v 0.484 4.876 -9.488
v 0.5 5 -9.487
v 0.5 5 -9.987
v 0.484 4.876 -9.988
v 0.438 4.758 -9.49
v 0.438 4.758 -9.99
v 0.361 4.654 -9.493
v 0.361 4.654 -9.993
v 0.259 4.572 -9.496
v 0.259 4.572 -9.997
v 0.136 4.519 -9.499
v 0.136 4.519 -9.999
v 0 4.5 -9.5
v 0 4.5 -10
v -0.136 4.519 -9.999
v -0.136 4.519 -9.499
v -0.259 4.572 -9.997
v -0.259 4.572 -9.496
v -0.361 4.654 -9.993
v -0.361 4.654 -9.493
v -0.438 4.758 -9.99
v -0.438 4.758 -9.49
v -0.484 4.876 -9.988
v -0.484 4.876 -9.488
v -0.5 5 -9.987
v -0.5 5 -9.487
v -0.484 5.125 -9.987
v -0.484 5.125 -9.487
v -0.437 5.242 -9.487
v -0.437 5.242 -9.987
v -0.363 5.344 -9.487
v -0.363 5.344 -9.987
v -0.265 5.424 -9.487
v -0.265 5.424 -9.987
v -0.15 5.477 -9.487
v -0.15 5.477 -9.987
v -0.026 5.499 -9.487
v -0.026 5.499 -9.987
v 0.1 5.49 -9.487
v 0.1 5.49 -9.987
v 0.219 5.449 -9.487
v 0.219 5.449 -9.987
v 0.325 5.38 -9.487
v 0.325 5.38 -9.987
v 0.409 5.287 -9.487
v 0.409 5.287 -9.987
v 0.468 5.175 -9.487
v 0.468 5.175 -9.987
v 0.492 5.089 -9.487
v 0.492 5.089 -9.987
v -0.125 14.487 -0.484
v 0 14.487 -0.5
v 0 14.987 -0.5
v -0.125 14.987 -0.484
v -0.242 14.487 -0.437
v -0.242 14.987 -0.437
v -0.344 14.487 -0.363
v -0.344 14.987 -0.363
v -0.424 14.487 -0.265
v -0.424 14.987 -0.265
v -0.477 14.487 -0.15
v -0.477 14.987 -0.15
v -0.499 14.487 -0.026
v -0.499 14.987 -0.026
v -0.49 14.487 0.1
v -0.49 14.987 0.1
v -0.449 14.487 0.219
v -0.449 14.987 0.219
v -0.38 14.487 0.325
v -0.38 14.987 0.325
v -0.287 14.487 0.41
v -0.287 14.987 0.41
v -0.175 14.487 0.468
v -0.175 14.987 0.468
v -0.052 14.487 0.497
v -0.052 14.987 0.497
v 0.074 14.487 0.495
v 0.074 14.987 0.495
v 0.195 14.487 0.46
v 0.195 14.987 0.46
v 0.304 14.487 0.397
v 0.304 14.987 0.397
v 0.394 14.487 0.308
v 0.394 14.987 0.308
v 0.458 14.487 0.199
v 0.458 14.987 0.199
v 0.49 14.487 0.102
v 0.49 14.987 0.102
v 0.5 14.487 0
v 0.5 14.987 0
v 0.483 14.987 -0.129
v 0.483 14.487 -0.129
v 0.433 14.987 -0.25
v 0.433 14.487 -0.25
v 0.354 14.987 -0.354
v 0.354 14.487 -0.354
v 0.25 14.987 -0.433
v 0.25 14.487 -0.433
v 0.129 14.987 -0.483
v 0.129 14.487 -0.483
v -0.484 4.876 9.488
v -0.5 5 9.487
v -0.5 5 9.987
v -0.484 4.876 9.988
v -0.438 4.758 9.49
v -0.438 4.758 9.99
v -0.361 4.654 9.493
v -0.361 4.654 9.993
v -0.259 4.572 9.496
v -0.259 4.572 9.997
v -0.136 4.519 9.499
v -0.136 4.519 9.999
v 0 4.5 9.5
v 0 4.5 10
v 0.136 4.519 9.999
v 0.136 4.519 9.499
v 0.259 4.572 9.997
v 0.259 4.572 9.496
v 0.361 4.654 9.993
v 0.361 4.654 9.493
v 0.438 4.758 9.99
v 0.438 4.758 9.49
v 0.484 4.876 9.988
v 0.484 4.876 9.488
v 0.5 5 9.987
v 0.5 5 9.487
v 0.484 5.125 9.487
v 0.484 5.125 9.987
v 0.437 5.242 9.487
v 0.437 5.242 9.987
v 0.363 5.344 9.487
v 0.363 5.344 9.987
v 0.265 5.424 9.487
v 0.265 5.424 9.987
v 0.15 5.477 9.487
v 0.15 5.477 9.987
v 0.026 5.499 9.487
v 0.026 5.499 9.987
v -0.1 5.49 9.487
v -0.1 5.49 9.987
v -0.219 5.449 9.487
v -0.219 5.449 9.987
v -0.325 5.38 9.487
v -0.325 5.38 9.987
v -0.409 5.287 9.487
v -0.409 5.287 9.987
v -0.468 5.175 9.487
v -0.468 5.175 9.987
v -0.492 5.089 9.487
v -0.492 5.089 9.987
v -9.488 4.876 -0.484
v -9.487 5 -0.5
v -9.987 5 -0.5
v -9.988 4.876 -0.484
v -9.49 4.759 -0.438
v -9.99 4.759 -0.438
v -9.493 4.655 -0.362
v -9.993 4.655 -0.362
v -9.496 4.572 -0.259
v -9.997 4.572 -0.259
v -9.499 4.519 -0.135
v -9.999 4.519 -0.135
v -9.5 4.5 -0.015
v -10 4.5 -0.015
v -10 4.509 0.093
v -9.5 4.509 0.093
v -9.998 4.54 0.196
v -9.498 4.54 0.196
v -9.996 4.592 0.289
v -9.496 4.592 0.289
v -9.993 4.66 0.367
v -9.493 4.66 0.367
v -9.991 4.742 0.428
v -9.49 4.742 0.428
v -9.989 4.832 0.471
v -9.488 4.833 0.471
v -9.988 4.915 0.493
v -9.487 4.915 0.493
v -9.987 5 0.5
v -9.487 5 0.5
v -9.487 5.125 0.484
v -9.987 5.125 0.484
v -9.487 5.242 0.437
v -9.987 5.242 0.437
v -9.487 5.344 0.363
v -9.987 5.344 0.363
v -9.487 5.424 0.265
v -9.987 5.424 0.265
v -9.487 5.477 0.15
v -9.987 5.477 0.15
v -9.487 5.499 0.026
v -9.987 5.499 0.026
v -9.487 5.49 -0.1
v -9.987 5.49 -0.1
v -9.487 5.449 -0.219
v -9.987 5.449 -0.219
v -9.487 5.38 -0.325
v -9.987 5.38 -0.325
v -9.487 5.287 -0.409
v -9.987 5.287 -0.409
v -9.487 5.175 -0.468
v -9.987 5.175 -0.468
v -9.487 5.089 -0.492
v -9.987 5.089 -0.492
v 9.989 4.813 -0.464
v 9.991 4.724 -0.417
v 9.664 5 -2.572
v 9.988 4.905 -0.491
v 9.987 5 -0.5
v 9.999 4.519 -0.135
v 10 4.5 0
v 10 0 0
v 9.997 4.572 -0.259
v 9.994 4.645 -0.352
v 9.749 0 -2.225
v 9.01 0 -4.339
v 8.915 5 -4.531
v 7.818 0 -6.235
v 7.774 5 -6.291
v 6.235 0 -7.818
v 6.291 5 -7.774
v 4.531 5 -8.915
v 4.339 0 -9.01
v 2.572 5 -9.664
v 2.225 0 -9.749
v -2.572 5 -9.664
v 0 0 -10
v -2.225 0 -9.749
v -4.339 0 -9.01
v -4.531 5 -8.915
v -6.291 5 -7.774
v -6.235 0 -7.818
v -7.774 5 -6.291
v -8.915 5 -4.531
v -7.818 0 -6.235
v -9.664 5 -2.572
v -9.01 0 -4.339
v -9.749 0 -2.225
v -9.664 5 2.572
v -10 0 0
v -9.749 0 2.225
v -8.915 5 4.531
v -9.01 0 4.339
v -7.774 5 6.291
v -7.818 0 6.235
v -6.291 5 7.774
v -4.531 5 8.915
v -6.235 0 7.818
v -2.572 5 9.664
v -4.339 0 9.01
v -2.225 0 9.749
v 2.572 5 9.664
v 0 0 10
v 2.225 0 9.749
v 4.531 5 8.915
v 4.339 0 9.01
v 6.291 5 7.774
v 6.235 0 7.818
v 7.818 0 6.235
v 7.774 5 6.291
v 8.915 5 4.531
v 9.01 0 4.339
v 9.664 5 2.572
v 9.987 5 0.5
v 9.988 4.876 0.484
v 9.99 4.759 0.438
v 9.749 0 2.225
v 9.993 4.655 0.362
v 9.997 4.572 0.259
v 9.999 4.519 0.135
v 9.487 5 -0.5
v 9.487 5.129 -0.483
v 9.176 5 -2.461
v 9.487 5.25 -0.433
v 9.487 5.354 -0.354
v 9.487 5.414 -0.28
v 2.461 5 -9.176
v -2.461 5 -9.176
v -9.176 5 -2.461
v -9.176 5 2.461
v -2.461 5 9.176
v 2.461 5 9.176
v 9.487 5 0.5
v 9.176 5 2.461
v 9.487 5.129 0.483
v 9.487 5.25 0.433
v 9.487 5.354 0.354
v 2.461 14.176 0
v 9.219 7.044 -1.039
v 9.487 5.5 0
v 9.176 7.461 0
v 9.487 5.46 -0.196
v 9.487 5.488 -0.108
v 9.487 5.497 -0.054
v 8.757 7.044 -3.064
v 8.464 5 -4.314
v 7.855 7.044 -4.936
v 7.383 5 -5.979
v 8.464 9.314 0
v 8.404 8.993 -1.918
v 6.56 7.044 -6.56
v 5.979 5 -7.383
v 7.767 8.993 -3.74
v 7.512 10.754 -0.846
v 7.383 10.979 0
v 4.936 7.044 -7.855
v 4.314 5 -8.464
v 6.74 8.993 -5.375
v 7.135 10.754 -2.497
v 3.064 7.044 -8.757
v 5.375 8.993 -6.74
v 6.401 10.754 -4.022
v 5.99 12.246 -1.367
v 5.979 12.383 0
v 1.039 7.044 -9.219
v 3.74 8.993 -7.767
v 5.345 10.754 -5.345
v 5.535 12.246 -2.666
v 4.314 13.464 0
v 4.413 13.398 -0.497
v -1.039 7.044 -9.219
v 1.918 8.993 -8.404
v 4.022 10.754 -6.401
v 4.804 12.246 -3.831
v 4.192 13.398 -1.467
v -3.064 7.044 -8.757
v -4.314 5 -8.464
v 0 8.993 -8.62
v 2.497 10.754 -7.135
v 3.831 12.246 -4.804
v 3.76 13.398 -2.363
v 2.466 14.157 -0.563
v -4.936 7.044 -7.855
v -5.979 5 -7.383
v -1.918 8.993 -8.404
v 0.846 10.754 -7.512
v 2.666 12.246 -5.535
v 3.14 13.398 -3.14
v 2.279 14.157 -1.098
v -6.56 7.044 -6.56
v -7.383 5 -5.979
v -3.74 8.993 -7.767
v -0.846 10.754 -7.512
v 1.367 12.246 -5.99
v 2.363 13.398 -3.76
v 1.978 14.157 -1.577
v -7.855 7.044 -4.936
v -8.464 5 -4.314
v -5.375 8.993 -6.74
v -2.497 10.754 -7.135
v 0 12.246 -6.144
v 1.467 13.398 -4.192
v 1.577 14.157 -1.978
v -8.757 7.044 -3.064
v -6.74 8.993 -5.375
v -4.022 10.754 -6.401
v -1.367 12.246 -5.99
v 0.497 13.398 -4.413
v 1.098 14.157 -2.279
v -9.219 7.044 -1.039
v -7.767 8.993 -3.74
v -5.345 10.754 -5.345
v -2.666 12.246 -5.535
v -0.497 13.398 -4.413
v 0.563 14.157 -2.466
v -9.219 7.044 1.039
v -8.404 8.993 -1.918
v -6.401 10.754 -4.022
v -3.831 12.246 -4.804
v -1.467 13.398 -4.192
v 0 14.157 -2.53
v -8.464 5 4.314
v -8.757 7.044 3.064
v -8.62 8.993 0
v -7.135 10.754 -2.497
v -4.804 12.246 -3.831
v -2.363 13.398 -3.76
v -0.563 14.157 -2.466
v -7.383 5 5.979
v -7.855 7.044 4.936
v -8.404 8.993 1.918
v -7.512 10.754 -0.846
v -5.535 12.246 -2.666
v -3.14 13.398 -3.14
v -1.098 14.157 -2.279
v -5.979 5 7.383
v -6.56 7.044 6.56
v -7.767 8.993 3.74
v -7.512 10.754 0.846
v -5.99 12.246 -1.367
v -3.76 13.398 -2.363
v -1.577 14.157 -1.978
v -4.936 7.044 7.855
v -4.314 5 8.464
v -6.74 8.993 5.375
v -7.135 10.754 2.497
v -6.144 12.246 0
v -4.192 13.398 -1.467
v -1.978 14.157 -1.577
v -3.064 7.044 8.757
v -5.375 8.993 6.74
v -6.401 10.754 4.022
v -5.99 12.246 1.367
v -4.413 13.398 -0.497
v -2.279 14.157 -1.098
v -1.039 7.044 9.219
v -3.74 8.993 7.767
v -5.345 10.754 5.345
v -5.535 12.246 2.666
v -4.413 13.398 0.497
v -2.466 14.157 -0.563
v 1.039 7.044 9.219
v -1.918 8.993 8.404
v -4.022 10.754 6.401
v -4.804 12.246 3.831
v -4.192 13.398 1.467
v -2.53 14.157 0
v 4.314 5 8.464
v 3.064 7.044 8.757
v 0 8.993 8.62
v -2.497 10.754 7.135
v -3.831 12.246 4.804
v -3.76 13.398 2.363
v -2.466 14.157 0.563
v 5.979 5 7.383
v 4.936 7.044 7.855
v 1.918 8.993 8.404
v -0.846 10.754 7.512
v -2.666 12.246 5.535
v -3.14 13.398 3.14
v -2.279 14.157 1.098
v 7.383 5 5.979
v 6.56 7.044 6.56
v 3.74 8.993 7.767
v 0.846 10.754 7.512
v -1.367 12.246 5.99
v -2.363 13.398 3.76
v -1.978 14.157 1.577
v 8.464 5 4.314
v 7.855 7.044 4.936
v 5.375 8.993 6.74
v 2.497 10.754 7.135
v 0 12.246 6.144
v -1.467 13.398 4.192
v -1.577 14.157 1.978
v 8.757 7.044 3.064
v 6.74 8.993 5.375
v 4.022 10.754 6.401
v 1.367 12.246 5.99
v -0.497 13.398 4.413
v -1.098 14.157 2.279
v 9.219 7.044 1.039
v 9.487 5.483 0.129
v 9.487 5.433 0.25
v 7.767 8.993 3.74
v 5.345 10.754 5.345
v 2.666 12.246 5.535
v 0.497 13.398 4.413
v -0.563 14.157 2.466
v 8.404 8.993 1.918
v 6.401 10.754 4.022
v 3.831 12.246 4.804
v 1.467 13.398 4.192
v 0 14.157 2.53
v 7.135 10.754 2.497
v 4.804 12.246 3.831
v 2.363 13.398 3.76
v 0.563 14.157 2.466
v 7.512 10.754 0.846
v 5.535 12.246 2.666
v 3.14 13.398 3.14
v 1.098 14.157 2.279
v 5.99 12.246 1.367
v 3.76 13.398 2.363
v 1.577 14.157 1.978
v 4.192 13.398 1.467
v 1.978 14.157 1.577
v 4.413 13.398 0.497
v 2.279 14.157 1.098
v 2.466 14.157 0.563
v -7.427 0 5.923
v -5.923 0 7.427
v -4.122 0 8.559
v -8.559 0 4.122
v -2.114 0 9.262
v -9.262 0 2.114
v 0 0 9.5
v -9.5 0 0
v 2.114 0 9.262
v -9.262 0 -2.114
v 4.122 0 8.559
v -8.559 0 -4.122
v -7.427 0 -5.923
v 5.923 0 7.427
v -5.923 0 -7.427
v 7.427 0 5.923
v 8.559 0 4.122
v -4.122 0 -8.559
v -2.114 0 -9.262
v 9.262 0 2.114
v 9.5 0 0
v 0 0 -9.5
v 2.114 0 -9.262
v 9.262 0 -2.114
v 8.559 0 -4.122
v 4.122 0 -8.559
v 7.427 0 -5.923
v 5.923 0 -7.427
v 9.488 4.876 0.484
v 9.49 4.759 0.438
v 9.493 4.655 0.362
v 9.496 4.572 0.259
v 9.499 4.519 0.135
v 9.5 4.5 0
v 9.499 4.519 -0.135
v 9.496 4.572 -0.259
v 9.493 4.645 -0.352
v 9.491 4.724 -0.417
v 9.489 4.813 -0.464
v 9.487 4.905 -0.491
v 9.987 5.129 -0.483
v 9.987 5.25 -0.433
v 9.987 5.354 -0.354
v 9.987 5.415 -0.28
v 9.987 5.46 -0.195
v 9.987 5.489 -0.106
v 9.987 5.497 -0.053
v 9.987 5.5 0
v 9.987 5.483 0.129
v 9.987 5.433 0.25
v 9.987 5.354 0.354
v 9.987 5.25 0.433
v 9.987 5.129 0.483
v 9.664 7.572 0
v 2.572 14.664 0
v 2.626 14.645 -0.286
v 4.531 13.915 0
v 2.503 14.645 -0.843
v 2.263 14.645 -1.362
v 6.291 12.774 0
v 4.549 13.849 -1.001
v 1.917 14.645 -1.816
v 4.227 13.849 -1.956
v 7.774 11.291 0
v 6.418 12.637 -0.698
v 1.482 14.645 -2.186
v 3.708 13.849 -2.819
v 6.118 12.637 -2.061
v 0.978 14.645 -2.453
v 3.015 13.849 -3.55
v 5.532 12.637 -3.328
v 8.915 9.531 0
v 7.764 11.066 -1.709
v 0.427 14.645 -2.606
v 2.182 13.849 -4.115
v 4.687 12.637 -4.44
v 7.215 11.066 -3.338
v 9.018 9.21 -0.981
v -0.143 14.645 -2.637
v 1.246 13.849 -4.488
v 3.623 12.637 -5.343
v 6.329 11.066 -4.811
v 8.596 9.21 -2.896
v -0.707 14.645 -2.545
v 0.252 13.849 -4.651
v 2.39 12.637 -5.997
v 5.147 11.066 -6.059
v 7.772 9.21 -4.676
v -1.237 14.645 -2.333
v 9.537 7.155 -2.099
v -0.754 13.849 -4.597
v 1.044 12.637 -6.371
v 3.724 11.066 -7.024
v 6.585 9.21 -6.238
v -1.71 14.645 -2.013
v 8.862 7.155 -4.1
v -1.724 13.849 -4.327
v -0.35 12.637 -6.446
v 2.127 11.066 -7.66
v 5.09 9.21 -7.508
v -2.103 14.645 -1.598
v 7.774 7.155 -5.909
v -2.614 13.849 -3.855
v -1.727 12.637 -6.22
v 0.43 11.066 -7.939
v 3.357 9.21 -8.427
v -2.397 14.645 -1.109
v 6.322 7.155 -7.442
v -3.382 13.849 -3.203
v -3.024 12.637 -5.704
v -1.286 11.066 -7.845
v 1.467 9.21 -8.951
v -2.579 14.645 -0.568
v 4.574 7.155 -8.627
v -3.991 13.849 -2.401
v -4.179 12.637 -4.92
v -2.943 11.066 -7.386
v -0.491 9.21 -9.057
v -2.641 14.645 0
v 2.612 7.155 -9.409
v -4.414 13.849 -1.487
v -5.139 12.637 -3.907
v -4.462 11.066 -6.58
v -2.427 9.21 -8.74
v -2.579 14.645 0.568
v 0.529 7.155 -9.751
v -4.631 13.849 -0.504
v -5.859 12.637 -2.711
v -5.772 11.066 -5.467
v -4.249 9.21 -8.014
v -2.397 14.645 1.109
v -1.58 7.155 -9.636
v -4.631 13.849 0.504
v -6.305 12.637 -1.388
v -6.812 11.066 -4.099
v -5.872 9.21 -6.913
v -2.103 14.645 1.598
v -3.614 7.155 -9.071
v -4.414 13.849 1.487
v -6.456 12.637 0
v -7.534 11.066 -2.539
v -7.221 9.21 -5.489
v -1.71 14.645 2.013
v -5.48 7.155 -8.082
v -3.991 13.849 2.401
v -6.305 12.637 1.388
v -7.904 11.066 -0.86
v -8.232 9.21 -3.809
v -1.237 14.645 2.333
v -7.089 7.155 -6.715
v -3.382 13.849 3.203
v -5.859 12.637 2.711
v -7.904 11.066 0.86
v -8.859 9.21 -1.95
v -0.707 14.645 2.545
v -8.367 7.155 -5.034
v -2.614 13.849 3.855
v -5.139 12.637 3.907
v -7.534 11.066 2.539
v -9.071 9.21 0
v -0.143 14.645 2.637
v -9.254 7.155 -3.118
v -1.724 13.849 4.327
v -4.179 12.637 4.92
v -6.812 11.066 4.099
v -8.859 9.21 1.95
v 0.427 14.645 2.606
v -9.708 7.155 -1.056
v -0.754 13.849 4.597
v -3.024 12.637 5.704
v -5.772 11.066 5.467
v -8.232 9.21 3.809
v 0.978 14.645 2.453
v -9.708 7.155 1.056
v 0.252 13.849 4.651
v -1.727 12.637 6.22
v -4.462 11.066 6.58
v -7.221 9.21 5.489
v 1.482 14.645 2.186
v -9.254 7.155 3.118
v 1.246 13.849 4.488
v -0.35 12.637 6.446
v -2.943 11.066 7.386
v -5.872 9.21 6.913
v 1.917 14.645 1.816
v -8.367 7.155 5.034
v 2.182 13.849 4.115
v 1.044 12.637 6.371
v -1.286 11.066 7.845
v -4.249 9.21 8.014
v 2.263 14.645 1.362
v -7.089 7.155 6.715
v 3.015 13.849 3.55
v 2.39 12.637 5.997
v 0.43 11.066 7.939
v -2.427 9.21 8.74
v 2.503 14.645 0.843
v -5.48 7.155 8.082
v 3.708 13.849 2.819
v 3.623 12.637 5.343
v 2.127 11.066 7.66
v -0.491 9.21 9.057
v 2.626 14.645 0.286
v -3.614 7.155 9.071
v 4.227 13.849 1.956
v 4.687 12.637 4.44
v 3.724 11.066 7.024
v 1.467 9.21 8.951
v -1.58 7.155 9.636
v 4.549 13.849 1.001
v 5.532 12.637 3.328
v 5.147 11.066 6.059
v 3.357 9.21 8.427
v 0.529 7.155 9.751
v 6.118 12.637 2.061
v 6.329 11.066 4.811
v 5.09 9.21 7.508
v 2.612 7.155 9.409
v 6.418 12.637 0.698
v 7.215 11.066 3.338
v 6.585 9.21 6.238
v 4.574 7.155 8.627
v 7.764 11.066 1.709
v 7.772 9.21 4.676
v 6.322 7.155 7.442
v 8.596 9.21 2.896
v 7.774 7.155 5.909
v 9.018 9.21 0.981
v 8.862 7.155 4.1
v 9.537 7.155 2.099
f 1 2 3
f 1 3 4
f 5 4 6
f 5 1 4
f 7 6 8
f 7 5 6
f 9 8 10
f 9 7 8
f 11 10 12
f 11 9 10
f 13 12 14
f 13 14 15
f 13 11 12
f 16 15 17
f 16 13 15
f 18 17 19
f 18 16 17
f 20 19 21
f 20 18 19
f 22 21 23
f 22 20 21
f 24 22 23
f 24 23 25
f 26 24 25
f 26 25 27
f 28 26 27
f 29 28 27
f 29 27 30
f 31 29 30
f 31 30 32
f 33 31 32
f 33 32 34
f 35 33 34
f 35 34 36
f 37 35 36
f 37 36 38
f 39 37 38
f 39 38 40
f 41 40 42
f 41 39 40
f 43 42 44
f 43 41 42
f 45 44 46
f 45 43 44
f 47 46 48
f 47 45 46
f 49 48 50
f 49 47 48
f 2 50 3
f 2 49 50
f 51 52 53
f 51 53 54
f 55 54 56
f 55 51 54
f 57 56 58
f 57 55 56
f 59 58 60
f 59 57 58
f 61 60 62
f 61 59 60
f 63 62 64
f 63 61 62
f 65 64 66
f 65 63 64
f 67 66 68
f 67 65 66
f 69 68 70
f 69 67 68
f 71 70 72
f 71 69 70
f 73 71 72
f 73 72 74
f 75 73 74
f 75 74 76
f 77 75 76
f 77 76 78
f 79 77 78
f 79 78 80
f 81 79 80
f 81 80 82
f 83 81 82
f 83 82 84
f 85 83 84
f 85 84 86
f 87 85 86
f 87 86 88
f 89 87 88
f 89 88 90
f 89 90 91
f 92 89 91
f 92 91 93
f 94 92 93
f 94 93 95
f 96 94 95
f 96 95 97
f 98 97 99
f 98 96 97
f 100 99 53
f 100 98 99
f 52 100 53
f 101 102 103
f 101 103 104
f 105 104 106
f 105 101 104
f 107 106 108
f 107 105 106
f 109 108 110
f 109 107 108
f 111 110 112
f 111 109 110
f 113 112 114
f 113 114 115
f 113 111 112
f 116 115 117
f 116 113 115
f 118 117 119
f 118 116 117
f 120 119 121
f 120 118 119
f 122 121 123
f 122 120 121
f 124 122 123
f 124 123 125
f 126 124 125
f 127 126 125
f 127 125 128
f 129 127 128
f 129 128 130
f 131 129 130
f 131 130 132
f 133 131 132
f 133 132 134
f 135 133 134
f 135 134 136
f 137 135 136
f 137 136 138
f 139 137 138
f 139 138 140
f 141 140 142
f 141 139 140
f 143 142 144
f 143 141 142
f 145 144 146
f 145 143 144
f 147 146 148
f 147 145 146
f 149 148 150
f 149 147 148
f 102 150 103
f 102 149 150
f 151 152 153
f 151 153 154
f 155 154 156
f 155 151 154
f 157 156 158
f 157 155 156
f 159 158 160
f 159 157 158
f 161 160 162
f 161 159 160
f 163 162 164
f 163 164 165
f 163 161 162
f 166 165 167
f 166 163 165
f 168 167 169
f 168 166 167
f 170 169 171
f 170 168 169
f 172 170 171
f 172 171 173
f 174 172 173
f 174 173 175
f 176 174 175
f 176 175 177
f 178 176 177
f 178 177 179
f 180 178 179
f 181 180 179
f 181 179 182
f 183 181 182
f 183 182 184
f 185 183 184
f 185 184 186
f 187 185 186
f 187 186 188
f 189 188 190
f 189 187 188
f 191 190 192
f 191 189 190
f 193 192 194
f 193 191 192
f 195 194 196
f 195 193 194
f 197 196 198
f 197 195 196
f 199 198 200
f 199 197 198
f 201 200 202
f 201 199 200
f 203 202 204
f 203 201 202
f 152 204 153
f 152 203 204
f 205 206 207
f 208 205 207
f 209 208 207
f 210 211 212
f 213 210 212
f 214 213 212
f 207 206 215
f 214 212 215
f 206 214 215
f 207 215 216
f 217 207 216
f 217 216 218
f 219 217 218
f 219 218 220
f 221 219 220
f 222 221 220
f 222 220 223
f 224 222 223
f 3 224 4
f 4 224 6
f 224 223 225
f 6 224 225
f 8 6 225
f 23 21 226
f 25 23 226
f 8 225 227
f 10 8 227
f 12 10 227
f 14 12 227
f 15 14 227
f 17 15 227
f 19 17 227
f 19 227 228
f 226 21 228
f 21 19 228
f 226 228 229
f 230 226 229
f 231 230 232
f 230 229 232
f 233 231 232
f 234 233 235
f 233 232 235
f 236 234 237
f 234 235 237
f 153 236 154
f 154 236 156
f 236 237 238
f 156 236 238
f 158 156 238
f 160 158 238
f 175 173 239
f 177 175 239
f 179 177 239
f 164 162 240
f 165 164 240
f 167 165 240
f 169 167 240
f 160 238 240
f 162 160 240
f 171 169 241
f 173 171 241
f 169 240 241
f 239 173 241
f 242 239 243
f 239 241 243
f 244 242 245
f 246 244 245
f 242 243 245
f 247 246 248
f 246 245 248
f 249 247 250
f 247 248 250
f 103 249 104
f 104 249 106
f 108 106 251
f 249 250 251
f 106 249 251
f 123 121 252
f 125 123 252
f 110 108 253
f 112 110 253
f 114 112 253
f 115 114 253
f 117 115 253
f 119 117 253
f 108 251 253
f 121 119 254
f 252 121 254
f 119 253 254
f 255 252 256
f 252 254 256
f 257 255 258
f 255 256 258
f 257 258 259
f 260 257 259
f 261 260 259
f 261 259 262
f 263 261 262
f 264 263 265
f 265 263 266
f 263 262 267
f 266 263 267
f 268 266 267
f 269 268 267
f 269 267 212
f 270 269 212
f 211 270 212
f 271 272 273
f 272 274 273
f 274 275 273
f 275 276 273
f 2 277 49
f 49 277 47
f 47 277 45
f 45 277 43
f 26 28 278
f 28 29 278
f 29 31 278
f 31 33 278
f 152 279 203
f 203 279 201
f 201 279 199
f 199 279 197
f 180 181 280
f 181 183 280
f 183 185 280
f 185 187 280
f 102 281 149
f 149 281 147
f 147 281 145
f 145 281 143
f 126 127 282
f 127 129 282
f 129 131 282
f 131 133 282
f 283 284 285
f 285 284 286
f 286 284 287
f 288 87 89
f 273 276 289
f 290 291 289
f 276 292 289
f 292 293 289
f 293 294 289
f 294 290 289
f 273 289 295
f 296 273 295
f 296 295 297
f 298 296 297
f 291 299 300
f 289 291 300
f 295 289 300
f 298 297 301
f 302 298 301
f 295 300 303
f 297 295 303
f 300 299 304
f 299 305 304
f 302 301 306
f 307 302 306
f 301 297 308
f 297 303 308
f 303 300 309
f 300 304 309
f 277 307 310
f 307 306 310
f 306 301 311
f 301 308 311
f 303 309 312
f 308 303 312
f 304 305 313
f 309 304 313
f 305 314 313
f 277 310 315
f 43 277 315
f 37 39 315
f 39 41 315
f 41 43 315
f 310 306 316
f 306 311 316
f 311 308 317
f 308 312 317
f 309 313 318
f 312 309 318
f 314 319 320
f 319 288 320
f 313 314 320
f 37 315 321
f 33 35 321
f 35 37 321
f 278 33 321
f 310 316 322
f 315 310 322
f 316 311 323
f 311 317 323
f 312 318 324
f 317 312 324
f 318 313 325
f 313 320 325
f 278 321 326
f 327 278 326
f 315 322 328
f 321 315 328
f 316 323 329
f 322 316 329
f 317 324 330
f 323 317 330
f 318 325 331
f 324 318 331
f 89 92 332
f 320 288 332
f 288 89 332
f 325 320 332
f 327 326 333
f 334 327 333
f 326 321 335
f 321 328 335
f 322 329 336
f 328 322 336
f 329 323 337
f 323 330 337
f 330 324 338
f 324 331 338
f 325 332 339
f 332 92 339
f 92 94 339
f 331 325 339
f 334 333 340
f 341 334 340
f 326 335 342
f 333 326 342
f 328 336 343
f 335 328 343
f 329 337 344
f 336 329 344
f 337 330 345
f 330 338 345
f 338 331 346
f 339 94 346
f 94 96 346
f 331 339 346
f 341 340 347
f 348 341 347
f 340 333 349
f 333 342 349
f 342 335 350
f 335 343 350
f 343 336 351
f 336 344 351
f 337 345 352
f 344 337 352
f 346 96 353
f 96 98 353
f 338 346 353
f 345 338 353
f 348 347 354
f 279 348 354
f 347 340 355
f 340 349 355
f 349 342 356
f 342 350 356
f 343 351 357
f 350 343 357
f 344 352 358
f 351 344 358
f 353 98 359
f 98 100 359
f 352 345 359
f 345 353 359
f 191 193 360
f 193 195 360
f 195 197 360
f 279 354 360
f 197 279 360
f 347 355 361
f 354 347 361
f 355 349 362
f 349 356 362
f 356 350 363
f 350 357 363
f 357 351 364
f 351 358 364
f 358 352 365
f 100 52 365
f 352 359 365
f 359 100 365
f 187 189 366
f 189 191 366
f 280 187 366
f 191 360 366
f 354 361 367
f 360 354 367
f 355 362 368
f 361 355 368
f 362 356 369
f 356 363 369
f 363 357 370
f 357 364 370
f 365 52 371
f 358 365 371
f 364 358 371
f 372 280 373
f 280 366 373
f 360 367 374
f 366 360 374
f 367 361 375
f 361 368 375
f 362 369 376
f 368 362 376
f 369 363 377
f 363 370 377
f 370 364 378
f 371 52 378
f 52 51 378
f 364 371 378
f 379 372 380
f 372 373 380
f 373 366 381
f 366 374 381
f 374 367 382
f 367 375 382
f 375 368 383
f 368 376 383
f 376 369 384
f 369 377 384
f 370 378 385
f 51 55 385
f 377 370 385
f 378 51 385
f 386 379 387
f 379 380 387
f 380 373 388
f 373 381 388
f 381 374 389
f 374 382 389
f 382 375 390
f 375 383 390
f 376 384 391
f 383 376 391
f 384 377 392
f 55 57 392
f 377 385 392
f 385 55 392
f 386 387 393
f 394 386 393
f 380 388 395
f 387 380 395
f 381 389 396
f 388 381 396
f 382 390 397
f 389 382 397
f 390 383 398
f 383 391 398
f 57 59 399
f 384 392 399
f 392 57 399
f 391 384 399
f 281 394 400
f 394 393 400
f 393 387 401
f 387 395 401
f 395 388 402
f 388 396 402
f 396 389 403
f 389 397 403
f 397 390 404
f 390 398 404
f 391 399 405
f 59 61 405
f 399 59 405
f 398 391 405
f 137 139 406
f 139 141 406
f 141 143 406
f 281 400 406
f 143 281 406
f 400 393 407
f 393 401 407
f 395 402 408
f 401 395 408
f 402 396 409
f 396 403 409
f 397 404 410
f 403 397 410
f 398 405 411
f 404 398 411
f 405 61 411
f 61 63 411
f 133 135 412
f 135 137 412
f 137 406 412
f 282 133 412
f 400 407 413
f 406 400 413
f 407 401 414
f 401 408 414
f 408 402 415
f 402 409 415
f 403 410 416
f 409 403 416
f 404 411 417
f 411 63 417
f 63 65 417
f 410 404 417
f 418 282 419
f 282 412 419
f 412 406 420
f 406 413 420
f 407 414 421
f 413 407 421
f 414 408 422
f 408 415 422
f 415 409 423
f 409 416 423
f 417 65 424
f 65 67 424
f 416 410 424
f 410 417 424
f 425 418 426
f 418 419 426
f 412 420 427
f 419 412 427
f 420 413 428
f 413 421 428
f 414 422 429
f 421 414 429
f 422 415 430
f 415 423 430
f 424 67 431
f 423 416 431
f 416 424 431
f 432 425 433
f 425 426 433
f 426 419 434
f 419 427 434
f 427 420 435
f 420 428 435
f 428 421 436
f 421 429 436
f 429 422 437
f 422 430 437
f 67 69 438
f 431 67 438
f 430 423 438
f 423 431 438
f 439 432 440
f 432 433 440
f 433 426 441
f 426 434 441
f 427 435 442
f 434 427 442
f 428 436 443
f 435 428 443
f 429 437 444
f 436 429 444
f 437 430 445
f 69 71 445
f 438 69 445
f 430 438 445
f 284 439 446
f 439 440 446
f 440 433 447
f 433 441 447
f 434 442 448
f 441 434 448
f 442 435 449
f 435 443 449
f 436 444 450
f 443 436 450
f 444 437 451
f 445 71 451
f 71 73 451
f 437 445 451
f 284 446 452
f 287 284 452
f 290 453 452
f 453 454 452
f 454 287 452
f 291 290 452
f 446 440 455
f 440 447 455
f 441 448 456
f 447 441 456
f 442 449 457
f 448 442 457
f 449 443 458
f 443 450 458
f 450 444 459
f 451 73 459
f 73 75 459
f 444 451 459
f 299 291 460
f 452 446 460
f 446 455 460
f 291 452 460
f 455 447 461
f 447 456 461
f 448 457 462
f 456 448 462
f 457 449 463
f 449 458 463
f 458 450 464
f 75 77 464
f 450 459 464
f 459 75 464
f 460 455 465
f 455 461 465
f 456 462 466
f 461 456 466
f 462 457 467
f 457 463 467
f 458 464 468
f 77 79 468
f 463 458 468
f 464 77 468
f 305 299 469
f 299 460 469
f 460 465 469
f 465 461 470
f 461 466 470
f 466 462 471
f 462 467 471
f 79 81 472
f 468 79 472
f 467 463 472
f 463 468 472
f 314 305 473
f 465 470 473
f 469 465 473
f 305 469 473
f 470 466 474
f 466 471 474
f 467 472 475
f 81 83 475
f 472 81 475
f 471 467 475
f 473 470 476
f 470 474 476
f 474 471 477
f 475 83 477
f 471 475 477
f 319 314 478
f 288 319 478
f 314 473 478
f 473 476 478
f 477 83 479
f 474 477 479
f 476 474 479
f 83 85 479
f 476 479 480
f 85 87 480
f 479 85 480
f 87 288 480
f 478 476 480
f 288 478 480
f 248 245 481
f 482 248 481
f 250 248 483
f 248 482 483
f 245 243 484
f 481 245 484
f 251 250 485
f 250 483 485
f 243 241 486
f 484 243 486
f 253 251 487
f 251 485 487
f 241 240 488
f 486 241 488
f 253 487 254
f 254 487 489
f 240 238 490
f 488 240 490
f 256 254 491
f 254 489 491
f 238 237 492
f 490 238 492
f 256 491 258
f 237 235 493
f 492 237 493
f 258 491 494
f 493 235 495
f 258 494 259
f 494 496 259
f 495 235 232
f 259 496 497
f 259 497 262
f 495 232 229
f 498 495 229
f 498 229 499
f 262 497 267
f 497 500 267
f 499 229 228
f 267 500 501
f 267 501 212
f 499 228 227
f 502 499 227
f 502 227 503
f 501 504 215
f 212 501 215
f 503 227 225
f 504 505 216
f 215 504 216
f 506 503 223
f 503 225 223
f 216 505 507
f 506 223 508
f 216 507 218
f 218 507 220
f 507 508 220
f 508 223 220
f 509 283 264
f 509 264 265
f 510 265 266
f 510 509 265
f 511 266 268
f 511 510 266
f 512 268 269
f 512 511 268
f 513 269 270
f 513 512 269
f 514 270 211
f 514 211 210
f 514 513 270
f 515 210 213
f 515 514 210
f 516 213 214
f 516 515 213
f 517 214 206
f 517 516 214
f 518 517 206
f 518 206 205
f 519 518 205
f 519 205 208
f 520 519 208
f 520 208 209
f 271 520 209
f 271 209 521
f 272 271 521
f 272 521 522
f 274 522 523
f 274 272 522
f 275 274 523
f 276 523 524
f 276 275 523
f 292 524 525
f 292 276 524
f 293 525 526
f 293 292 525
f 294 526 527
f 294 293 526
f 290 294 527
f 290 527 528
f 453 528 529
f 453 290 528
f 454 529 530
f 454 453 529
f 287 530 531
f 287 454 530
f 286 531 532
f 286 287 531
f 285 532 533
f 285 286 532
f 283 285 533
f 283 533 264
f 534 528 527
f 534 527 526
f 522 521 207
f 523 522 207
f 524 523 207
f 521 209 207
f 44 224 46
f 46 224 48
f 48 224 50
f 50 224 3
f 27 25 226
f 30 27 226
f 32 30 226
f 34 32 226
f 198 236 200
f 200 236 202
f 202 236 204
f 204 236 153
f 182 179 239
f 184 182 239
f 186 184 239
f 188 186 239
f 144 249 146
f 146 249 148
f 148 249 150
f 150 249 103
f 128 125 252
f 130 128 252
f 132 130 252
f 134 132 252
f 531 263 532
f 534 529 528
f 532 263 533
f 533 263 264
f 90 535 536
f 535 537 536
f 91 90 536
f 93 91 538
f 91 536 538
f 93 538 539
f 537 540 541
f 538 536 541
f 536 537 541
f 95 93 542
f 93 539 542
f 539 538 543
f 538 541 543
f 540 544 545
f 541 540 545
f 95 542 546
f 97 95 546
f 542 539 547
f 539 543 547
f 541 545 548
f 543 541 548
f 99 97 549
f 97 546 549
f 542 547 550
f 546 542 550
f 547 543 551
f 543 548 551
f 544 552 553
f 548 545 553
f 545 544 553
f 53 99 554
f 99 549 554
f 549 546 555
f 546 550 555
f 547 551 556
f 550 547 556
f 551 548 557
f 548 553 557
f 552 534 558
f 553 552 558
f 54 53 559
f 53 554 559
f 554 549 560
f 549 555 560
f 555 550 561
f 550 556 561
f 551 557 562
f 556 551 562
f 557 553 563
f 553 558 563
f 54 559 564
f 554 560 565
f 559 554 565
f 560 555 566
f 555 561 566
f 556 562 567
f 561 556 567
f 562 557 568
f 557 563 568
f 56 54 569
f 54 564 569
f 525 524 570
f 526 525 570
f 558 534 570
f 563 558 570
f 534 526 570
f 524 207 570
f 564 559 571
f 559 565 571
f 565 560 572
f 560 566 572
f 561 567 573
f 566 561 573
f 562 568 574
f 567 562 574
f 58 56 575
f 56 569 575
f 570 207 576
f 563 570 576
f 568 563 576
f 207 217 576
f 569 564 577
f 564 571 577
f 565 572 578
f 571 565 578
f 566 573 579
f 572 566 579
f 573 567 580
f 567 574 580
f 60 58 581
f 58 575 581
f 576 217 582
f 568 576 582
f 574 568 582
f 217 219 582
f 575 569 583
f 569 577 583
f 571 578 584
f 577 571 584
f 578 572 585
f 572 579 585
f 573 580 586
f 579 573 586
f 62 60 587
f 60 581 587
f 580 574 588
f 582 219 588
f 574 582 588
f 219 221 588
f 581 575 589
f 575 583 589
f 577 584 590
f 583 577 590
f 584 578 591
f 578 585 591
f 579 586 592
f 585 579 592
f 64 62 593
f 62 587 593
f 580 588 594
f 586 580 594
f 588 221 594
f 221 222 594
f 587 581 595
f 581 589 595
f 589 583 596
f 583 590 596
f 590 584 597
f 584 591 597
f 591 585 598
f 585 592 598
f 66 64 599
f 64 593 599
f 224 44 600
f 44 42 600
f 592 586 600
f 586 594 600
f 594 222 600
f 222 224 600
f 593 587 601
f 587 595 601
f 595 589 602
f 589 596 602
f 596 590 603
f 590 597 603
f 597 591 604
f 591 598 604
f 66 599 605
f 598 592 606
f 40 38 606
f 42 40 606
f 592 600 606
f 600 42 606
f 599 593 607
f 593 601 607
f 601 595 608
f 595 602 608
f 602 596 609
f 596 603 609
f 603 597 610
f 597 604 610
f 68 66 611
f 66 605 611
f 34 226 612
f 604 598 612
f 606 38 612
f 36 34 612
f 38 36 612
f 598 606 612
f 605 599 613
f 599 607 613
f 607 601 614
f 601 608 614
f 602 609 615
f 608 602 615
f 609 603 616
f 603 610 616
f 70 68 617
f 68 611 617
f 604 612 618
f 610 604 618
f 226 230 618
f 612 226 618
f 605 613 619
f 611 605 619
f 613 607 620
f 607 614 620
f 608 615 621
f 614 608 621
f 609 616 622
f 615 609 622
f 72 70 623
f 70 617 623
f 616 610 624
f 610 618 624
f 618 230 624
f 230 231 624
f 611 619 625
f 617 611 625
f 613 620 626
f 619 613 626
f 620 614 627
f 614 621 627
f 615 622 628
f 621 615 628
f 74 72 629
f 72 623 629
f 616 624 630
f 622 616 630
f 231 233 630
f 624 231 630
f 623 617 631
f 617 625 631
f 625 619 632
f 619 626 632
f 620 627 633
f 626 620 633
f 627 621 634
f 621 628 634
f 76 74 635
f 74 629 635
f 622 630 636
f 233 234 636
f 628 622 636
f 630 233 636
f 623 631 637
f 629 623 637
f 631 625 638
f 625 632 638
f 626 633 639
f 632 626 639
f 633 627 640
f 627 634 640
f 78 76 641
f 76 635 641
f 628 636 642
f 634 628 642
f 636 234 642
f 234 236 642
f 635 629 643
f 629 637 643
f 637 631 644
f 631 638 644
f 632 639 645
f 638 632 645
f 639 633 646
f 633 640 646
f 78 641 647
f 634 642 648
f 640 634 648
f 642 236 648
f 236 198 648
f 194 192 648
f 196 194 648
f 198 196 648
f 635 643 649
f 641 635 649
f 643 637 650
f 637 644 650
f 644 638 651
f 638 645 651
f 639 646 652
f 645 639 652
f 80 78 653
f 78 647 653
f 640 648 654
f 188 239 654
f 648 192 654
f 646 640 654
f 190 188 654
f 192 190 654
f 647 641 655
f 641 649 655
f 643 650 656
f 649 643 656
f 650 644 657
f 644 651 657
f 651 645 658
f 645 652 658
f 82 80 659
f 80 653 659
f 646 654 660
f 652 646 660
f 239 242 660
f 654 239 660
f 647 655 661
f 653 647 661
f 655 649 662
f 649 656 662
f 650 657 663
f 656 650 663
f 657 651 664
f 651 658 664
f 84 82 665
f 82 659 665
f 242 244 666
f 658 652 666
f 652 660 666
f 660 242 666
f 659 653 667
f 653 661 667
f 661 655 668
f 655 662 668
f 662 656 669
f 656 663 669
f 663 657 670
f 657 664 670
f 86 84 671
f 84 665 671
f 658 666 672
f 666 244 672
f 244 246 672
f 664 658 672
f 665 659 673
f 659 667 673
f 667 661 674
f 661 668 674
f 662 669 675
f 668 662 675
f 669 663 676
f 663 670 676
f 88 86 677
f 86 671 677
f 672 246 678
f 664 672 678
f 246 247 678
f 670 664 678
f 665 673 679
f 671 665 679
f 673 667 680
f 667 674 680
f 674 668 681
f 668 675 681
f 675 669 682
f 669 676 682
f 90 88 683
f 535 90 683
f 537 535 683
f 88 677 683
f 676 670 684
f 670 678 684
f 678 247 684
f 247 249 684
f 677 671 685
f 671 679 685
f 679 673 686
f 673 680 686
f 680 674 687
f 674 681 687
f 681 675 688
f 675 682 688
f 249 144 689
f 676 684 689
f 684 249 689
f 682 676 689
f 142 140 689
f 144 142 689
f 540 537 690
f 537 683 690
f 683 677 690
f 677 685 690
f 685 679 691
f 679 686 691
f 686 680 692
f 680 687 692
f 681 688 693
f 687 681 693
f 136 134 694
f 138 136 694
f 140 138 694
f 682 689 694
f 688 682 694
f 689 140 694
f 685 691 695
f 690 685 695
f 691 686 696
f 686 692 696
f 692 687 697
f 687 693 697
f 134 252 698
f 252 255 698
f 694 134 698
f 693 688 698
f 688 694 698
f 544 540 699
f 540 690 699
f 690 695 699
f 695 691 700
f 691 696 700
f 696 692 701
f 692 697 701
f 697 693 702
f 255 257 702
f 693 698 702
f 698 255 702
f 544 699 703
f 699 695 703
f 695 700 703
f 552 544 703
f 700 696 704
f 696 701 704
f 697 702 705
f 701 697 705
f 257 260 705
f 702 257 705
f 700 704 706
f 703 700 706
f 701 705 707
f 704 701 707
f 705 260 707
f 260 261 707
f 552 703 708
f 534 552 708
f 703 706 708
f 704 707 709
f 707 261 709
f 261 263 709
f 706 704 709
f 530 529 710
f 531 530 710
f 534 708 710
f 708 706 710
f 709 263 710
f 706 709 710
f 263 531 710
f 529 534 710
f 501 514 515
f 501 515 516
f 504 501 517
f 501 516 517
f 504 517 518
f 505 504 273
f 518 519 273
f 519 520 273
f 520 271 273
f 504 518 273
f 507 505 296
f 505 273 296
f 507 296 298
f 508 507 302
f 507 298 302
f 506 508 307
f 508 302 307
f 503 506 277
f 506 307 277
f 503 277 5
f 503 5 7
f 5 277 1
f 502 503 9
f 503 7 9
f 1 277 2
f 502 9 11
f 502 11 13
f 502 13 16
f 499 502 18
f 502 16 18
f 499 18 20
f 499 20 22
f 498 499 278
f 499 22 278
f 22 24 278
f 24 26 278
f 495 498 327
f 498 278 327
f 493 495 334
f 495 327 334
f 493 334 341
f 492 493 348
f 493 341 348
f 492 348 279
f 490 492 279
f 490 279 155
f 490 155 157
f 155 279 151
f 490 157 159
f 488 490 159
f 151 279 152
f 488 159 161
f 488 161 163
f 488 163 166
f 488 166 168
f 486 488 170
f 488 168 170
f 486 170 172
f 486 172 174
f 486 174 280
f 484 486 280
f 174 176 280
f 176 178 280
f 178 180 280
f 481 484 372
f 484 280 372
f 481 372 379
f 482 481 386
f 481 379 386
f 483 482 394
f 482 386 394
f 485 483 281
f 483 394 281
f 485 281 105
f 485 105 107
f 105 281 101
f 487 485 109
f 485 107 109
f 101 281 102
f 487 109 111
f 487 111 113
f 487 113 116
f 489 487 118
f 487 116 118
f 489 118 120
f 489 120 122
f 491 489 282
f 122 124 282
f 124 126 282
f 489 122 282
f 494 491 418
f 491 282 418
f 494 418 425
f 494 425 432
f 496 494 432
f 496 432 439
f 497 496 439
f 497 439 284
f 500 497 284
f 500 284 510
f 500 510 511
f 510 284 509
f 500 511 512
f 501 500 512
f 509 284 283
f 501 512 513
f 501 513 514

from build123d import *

# Parameters (mm, degrees)
SKETCH5_R          = 0.5
CUT_EXTRUDE1_DEPTH = 21.615528128
CIRPATTERN1_COUNT  = 4
SKETCH6_R          = 0.5
CUT_EXTRUDE2_DEPTH = 21.615528225


with BuildPart() as part:
    # Sketch1 → Revolve2 (revolve)
    with BuildSketch(Plane.XY):
        with BuildLine():
            Line((10, 5), (10, 0))
            Line((10, 0), (9.5, 0))
            Line((9.5, 0), (9.5, 5))
            ThreePointArc((9.5, 5), (6.717514421, 11.717514421), (0, 14.5))
            Line((0, 14.5), (0, 15))
            ThreePointArc((0, 15), (7.071067812, 12.071067812), (10, 5))
        make_face()
    revolve(axis=Axis((0, 0, 0), (0, 1, 0)))

    # Sketch5 → Cut-Extrude1 (cut, through all)
    with BuildSketch(Plane.XY):
        with Locations(Location((0, 5, 0), (0, 0, 180))):
            Circle(SKETCH5_R)
    cut_extrude1 = extrude(amount=CUT_EXTRUDE1_DEPTH, mode=Mode.SUBTRACT)

    # CirPattern1: Cut-Extrude1 ×4 about axis
    cirpattern1_axis = Axis((0, 0, 0), (0, -1, 0))
    for i in range(1, CIRPATTERN1_COUNT):
        add(cut_extrude1.rotate(cirpattern1_axis, i * 360 / CIRPATTERN1_COUNT), mode=Mode.SUBTRACT)

    # Sketch6 → Cut-Extrude2 (cut, through all)
    with BuildSketch(Plane(origin=(0, 0, 0), x_dir=(1, 0, 0), z_dir=(0, 1, 0))):
        with Locations(Location((0, 0, 0), (0, 0, 90))):
            Circle(SKETCH6_R)
    extrude(amount=CUT_EXTRUDE2_DEPTH, mode=Mode.SUBTRACT)


solid = part.part
